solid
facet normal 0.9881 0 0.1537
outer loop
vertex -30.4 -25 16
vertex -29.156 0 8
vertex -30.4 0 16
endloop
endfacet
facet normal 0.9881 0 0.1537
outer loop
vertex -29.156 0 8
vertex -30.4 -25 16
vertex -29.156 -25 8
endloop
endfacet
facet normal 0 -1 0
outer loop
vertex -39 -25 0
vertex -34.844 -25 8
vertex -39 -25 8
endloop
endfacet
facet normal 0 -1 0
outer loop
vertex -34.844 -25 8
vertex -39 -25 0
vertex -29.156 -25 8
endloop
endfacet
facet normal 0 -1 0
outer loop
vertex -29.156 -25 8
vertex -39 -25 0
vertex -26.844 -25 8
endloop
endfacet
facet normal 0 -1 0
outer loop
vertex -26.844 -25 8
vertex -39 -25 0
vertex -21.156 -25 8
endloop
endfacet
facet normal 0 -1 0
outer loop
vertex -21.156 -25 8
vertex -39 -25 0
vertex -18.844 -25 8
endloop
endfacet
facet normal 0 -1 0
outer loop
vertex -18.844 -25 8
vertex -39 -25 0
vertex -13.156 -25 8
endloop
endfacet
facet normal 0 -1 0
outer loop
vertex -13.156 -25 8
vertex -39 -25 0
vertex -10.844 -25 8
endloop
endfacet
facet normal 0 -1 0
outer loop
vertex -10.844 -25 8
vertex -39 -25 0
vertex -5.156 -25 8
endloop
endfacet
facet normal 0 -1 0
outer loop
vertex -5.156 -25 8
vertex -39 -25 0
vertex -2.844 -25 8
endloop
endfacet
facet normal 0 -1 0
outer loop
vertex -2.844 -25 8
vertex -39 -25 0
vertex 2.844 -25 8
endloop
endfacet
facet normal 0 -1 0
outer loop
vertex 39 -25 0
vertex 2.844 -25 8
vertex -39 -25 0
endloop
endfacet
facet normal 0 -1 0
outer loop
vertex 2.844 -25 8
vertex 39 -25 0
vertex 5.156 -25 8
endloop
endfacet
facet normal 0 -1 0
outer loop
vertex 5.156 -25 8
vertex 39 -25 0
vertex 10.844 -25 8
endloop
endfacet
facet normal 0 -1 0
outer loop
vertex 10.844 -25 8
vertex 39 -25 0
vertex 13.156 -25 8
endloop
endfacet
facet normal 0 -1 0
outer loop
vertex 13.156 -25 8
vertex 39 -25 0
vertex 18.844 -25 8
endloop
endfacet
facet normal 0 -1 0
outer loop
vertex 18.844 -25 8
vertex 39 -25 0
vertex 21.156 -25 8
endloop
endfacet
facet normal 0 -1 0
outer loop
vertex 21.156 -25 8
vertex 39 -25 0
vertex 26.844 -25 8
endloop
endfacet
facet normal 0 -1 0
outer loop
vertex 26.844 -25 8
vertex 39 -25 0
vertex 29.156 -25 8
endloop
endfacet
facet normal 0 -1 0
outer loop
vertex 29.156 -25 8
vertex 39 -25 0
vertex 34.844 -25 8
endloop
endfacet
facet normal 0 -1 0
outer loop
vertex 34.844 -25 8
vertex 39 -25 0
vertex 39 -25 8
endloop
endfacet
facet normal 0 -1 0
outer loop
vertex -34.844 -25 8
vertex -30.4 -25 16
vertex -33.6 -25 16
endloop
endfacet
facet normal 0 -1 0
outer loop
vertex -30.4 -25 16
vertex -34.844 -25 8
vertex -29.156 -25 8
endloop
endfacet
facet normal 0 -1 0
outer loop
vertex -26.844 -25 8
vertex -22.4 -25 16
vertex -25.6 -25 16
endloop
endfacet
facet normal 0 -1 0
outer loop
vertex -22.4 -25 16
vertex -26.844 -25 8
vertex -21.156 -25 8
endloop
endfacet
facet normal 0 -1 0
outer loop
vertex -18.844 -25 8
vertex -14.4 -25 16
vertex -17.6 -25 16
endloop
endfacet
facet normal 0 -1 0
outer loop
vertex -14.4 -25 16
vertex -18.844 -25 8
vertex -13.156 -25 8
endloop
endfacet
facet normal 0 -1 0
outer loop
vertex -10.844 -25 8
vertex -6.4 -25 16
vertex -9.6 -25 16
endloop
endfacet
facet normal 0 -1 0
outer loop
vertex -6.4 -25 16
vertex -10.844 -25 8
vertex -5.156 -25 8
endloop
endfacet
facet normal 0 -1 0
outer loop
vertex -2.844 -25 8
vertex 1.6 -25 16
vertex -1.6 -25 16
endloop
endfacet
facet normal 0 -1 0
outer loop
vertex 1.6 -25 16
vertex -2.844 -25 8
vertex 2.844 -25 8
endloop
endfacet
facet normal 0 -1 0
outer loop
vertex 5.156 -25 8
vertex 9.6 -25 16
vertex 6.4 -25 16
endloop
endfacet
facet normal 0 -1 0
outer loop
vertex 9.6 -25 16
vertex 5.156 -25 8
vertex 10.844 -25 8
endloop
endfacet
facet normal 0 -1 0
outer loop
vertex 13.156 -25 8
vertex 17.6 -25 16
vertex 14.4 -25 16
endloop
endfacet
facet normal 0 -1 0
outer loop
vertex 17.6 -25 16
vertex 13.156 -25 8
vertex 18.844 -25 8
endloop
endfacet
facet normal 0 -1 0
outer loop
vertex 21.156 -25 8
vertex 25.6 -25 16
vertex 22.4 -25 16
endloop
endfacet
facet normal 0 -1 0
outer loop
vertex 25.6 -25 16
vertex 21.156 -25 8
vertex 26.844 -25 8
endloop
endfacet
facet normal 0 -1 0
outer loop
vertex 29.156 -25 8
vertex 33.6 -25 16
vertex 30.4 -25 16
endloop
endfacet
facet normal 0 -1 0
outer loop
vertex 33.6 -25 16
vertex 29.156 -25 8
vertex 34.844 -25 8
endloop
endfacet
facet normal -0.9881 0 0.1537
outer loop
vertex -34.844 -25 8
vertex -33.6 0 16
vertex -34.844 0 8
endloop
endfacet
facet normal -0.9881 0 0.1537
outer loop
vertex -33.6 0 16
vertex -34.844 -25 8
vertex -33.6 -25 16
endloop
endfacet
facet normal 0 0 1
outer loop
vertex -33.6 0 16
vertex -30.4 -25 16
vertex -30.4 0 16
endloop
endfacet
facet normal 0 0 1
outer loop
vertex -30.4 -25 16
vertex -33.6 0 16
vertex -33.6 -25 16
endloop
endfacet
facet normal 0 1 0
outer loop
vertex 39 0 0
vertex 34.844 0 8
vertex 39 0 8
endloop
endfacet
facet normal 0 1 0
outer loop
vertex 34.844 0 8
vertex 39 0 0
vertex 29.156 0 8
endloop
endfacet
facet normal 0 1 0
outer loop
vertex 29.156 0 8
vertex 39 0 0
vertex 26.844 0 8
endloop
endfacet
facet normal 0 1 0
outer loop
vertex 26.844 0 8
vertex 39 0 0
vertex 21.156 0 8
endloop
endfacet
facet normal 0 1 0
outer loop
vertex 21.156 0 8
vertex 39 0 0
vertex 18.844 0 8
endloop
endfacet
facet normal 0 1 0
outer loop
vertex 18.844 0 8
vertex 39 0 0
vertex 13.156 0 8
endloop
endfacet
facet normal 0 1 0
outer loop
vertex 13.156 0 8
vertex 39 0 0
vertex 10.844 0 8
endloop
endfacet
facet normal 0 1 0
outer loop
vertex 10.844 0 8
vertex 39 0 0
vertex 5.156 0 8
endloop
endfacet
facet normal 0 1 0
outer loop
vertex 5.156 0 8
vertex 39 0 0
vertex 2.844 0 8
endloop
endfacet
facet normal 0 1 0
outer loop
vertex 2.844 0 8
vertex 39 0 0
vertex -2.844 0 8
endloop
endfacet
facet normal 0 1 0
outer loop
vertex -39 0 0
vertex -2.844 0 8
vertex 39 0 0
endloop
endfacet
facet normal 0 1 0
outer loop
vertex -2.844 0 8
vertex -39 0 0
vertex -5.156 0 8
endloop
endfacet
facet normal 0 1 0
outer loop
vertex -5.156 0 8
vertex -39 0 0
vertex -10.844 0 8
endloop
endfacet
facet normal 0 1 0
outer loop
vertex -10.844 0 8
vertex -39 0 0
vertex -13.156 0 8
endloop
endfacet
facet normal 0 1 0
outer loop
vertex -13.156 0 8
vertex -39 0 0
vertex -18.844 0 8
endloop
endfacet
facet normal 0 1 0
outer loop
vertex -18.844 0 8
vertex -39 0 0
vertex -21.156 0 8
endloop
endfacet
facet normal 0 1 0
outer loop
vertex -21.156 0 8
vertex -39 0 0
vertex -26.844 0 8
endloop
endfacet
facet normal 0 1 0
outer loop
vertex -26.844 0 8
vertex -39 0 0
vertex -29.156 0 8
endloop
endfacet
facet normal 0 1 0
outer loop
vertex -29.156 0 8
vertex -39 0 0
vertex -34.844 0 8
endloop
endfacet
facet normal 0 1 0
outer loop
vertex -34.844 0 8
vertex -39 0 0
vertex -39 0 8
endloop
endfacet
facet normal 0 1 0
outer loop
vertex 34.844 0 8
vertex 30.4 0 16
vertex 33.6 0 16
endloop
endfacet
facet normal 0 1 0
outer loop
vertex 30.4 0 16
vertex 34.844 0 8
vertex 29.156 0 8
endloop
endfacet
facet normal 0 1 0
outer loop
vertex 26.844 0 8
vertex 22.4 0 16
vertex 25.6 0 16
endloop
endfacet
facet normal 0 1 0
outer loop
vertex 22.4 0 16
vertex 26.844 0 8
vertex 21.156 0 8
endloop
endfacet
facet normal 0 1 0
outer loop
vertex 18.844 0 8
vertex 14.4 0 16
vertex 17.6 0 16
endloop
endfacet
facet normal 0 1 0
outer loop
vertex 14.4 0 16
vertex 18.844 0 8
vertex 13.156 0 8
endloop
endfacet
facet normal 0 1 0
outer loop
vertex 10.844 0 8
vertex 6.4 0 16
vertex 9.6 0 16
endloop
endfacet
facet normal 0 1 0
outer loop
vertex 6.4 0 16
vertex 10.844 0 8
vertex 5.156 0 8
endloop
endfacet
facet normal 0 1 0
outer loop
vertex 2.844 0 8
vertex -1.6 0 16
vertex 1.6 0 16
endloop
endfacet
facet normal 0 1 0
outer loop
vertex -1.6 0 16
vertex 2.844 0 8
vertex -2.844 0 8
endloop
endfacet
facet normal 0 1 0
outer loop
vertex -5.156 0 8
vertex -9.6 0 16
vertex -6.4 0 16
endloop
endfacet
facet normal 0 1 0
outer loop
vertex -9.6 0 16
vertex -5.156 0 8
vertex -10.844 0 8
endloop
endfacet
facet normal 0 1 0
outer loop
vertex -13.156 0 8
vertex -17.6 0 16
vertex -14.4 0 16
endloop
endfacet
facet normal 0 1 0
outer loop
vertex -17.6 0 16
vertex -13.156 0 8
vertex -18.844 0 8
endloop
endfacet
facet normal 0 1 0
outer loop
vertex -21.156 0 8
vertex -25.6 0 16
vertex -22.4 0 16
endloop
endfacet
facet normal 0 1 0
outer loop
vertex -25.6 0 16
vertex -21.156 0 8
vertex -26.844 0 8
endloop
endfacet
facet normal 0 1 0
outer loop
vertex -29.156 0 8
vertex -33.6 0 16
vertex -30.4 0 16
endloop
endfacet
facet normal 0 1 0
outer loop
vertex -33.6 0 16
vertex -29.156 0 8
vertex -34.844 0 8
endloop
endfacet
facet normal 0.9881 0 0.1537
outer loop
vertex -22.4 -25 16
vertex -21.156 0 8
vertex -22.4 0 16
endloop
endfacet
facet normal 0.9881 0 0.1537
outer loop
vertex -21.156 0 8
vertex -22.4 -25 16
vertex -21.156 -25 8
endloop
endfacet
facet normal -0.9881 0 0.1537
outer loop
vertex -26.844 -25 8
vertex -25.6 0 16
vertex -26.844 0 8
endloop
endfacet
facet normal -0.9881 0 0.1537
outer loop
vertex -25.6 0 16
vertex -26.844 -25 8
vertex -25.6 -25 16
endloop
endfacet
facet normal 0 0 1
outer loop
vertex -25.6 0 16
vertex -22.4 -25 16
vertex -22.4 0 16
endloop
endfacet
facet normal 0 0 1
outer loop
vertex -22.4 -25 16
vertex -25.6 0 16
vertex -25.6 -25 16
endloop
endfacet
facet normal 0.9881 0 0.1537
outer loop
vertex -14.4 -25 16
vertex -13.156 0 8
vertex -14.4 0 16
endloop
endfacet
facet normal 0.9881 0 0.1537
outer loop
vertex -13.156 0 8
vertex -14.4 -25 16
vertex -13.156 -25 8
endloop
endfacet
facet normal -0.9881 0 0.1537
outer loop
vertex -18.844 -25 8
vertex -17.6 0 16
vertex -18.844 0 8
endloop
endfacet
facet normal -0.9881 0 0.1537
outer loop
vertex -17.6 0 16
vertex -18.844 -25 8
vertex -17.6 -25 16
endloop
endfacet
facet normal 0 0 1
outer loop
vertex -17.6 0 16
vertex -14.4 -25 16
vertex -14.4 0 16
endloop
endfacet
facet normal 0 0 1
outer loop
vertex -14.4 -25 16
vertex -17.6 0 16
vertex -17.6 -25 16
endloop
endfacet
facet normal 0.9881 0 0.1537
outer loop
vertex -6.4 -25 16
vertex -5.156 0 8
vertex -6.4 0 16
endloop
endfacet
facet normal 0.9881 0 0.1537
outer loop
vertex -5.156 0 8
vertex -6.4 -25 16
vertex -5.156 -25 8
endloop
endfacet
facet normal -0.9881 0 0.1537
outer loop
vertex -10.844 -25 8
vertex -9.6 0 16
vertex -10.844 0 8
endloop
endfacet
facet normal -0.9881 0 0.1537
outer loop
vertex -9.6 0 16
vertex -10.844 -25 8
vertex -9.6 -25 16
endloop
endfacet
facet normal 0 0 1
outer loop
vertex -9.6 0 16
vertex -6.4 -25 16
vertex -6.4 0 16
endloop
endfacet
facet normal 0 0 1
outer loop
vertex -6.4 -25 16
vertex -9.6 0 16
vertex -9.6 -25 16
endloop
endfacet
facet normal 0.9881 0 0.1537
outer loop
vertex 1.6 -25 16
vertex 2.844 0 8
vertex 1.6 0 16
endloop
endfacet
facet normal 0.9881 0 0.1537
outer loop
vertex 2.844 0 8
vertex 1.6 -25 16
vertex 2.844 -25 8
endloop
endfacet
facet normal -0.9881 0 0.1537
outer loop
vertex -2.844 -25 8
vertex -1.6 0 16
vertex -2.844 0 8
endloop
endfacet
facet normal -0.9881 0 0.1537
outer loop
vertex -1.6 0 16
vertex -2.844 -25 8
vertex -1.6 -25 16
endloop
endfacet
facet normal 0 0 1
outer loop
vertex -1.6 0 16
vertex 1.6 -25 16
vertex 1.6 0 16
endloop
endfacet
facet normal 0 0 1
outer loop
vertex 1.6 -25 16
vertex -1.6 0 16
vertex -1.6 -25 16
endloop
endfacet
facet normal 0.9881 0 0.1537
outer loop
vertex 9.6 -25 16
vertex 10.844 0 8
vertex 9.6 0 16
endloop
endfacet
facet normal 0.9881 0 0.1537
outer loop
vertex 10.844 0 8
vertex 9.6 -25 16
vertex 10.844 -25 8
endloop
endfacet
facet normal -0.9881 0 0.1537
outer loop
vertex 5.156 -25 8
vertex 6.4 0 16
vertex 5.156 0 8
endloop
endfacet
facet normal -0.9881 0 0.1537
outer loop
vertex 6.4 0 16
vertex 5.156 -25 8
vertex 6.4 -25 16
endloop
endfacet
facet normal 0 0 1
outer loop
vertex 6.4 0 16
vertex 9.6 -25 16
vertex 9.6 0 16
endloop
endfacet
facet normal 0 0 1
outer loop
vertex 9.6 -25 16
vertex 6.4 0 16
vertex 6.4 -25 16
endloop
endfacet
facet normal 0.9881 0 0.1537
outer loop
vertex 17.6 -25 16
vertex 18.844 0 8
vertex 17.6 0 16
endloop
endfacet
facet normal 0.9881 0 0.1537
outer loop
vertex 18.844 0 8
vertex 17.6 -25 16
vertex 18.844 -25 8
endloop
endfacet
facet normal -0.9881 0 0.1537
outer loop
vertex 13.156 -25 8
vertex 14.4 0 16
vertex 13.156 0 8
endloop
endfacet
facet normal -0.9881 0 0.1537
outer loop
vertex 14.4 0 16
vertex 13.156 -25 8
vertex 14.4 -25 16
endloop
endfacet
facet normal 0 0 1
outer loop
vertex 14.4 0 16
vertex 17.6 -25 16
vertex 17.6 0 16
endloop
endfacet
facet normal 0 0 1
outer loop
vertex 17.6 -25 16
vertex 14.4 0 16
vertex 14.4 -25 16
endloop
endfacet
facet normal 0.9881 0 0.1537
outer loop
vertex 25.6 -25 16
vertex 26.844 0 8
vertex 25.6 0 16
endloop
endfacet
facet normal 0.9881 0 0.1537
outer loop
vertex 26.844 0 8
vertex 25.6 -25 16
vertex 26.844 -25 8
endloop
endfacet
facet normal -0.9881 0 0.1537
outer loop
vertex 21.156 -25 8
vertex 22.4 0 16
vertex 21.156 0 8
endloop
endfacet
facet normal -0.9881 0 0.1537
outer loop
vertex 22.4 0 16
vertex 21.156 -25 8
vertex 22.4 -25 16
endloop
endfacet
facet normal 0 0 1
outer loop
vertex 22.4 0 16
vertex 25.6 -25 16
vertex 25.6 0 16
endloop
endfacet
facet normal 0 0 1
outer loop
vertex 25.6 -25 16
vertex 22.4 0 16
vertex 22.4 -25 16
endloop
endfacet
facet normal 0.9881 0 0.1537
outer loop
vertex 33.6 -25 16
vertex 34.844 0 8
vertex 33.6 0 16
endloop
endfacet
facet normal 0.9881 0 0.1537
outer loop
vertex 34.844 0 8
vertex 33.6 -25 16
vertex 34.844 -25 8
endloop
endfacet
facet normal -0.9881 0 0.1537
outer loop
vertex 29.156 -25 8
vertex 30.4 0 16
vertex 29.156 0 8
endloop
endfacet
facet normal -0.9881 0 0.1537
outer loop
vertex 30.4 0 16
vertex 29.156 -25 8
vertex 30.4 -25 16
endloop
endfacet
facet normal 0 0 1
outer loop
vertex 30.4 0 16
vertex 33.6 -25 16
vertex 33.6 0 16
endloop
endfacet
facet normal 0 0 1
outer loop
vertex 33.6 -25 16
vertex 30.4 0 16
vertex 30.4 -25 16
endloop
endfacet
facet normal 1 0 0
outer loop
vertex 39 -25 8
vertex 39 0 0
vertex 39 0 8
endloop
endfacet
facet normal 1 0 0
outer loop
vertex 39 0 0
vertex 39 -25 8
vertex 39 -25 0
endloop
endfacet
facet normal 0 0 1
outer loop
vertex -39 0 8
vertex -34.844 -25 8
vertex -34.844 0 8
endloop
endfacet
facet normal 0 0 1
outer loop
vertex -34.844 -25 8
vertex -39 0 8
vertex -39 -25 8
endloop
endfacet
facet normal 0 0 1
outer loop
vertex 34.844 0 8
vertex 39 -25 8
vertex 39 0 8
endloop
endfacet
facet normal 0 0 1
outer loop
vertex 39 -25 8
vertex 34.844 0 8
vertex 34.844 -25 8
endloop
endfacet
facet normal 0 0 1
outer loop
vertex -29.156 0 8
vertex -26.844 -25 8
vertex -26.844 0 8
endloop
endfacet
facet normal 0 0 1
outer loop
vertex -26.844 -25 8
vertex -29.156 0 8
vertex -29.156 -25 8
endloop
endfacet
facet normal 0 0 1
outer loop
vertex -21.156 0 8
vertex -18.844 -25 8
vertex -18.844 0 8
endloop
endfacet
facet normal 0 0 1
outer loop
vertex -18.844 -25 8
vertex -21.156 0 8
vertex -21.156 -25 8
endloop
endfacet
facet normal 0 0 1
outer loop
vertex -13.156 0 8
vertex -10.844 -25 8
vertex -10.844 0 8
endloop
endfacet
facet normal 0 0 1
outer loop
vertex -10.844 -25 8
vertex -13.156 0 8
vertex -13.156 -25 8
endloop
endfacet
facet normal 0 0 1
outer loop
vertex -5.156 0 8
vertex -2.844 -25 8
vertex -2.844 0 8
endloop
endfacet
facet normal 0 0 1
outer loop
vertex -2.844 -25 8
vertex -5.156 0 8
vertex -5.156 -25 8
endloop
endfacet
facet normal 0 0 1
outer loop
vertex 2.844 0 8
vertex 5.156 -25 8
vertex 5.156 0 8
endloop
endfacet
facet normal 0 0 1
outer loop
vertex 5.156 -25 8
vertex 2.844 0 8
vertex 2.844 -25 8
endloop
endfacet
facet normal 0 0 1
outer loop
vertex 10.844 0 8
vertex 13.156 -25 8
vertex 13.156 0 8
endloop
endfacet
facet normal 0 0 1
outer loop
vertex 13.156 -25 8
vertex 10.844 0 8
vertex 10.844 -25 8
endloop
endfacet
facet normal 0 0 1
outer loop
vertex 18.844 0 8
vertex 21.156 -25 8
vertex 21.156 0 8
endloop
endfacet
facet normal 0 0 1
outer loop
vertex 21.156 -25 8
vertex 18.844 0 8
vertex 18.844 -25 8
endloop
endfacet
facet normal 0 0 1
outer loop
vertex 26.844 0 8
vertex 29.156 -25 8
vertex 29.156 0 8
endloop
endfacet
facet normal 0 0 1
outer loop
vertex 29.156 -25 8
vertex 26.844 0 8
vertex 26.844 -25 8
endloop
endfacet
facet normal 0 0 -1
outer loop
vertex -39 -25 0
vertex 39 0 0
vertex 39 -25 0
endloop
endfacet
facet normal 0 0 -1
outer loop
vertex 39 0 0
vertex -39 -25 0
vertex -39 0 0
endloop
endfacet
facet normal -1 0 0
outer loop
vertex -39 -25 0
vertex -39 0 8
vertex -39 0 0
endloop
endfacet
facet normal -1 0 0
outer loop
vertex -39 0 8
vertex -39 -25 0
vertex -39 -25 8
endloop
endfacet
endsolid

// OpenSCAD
$fn = 32;

// ----------------------------------------------------------------------
// Toothed rack, 9 teeth
// 8 mm pitch, 8 mm teeth
// ----------------------------------------------------------------------

// --- parameters (mm) ---
bar_w = 25;       // bar width (Y)
seat_tol = 0.05;  // tolerance at the seating features
free_tol = 0.3;   // general tolerance on the free sizes
bar_h = 8;        // bar height (Z)
teeth = 9;        // number of teeth
pitch = 8;        // tooth pitch
tooth_h = 8;      // tooth height above the bar
root_w = 6;       // tooth width at the root
crest_w = 3.2;    // tooth width at the crest

// --- derived feature positions (mm) ---
span = (teeth - 1) * pitch;  // = 64   distance between the outer teeth
bar_l = span + root_w + 8;   // = 78   bar length: teeth plus 4 mm at each end
tooth_x = -span / 2;         // = -32   X of the first tooth
height = bar_h + tooth_h;    // = 16   overall height
feature_centers = [
  [tooth_x + 0 * pitch, -bar_w / 2],
  [tooth_x + 1 * pitch, -bar_w / 2],
  [tooth_x + 2 * pitch, -bar_w / 2],
  [tooth_x + 3 * pitch, -bar_w / 2],
  [tooth_x + 4 * pitch, -bar_w / 2],
  [tooth_x + 5 * pitch, -bar_w / 2],
  [tooth_x + 6 * pitch, -bar_w / 2],
  [tooth_x + 7 * pitch, -bar_w / 2],
  [tooth_x + 8 * pitch, -bar_w / 2]
];   // tooth centre line, drives the tooth loop

// bar with a rack of teeth, one extruded trapezoium per centre
module rack_tooth() {
  linear_extrude(height = bar_w)
    polygon(points = [
      [0, 0],
      [root_w, 0],
      [root_w / 2 + crest_w / 2, tooth_h + 1],
      [root_w / 2 - crest_w / 2, tooth_h + 1]
    ]);
}

union() {
  translate([-bar_l / 2, -bar_w, 0]) cube([bar_l, bar_w, bar_h]);
  for (centre = feature_centers)
    translate([centre[0] - root_w / 2, 0, bar_h - 1]) rotate([90, 0, 0]) rack_tooth();
}
